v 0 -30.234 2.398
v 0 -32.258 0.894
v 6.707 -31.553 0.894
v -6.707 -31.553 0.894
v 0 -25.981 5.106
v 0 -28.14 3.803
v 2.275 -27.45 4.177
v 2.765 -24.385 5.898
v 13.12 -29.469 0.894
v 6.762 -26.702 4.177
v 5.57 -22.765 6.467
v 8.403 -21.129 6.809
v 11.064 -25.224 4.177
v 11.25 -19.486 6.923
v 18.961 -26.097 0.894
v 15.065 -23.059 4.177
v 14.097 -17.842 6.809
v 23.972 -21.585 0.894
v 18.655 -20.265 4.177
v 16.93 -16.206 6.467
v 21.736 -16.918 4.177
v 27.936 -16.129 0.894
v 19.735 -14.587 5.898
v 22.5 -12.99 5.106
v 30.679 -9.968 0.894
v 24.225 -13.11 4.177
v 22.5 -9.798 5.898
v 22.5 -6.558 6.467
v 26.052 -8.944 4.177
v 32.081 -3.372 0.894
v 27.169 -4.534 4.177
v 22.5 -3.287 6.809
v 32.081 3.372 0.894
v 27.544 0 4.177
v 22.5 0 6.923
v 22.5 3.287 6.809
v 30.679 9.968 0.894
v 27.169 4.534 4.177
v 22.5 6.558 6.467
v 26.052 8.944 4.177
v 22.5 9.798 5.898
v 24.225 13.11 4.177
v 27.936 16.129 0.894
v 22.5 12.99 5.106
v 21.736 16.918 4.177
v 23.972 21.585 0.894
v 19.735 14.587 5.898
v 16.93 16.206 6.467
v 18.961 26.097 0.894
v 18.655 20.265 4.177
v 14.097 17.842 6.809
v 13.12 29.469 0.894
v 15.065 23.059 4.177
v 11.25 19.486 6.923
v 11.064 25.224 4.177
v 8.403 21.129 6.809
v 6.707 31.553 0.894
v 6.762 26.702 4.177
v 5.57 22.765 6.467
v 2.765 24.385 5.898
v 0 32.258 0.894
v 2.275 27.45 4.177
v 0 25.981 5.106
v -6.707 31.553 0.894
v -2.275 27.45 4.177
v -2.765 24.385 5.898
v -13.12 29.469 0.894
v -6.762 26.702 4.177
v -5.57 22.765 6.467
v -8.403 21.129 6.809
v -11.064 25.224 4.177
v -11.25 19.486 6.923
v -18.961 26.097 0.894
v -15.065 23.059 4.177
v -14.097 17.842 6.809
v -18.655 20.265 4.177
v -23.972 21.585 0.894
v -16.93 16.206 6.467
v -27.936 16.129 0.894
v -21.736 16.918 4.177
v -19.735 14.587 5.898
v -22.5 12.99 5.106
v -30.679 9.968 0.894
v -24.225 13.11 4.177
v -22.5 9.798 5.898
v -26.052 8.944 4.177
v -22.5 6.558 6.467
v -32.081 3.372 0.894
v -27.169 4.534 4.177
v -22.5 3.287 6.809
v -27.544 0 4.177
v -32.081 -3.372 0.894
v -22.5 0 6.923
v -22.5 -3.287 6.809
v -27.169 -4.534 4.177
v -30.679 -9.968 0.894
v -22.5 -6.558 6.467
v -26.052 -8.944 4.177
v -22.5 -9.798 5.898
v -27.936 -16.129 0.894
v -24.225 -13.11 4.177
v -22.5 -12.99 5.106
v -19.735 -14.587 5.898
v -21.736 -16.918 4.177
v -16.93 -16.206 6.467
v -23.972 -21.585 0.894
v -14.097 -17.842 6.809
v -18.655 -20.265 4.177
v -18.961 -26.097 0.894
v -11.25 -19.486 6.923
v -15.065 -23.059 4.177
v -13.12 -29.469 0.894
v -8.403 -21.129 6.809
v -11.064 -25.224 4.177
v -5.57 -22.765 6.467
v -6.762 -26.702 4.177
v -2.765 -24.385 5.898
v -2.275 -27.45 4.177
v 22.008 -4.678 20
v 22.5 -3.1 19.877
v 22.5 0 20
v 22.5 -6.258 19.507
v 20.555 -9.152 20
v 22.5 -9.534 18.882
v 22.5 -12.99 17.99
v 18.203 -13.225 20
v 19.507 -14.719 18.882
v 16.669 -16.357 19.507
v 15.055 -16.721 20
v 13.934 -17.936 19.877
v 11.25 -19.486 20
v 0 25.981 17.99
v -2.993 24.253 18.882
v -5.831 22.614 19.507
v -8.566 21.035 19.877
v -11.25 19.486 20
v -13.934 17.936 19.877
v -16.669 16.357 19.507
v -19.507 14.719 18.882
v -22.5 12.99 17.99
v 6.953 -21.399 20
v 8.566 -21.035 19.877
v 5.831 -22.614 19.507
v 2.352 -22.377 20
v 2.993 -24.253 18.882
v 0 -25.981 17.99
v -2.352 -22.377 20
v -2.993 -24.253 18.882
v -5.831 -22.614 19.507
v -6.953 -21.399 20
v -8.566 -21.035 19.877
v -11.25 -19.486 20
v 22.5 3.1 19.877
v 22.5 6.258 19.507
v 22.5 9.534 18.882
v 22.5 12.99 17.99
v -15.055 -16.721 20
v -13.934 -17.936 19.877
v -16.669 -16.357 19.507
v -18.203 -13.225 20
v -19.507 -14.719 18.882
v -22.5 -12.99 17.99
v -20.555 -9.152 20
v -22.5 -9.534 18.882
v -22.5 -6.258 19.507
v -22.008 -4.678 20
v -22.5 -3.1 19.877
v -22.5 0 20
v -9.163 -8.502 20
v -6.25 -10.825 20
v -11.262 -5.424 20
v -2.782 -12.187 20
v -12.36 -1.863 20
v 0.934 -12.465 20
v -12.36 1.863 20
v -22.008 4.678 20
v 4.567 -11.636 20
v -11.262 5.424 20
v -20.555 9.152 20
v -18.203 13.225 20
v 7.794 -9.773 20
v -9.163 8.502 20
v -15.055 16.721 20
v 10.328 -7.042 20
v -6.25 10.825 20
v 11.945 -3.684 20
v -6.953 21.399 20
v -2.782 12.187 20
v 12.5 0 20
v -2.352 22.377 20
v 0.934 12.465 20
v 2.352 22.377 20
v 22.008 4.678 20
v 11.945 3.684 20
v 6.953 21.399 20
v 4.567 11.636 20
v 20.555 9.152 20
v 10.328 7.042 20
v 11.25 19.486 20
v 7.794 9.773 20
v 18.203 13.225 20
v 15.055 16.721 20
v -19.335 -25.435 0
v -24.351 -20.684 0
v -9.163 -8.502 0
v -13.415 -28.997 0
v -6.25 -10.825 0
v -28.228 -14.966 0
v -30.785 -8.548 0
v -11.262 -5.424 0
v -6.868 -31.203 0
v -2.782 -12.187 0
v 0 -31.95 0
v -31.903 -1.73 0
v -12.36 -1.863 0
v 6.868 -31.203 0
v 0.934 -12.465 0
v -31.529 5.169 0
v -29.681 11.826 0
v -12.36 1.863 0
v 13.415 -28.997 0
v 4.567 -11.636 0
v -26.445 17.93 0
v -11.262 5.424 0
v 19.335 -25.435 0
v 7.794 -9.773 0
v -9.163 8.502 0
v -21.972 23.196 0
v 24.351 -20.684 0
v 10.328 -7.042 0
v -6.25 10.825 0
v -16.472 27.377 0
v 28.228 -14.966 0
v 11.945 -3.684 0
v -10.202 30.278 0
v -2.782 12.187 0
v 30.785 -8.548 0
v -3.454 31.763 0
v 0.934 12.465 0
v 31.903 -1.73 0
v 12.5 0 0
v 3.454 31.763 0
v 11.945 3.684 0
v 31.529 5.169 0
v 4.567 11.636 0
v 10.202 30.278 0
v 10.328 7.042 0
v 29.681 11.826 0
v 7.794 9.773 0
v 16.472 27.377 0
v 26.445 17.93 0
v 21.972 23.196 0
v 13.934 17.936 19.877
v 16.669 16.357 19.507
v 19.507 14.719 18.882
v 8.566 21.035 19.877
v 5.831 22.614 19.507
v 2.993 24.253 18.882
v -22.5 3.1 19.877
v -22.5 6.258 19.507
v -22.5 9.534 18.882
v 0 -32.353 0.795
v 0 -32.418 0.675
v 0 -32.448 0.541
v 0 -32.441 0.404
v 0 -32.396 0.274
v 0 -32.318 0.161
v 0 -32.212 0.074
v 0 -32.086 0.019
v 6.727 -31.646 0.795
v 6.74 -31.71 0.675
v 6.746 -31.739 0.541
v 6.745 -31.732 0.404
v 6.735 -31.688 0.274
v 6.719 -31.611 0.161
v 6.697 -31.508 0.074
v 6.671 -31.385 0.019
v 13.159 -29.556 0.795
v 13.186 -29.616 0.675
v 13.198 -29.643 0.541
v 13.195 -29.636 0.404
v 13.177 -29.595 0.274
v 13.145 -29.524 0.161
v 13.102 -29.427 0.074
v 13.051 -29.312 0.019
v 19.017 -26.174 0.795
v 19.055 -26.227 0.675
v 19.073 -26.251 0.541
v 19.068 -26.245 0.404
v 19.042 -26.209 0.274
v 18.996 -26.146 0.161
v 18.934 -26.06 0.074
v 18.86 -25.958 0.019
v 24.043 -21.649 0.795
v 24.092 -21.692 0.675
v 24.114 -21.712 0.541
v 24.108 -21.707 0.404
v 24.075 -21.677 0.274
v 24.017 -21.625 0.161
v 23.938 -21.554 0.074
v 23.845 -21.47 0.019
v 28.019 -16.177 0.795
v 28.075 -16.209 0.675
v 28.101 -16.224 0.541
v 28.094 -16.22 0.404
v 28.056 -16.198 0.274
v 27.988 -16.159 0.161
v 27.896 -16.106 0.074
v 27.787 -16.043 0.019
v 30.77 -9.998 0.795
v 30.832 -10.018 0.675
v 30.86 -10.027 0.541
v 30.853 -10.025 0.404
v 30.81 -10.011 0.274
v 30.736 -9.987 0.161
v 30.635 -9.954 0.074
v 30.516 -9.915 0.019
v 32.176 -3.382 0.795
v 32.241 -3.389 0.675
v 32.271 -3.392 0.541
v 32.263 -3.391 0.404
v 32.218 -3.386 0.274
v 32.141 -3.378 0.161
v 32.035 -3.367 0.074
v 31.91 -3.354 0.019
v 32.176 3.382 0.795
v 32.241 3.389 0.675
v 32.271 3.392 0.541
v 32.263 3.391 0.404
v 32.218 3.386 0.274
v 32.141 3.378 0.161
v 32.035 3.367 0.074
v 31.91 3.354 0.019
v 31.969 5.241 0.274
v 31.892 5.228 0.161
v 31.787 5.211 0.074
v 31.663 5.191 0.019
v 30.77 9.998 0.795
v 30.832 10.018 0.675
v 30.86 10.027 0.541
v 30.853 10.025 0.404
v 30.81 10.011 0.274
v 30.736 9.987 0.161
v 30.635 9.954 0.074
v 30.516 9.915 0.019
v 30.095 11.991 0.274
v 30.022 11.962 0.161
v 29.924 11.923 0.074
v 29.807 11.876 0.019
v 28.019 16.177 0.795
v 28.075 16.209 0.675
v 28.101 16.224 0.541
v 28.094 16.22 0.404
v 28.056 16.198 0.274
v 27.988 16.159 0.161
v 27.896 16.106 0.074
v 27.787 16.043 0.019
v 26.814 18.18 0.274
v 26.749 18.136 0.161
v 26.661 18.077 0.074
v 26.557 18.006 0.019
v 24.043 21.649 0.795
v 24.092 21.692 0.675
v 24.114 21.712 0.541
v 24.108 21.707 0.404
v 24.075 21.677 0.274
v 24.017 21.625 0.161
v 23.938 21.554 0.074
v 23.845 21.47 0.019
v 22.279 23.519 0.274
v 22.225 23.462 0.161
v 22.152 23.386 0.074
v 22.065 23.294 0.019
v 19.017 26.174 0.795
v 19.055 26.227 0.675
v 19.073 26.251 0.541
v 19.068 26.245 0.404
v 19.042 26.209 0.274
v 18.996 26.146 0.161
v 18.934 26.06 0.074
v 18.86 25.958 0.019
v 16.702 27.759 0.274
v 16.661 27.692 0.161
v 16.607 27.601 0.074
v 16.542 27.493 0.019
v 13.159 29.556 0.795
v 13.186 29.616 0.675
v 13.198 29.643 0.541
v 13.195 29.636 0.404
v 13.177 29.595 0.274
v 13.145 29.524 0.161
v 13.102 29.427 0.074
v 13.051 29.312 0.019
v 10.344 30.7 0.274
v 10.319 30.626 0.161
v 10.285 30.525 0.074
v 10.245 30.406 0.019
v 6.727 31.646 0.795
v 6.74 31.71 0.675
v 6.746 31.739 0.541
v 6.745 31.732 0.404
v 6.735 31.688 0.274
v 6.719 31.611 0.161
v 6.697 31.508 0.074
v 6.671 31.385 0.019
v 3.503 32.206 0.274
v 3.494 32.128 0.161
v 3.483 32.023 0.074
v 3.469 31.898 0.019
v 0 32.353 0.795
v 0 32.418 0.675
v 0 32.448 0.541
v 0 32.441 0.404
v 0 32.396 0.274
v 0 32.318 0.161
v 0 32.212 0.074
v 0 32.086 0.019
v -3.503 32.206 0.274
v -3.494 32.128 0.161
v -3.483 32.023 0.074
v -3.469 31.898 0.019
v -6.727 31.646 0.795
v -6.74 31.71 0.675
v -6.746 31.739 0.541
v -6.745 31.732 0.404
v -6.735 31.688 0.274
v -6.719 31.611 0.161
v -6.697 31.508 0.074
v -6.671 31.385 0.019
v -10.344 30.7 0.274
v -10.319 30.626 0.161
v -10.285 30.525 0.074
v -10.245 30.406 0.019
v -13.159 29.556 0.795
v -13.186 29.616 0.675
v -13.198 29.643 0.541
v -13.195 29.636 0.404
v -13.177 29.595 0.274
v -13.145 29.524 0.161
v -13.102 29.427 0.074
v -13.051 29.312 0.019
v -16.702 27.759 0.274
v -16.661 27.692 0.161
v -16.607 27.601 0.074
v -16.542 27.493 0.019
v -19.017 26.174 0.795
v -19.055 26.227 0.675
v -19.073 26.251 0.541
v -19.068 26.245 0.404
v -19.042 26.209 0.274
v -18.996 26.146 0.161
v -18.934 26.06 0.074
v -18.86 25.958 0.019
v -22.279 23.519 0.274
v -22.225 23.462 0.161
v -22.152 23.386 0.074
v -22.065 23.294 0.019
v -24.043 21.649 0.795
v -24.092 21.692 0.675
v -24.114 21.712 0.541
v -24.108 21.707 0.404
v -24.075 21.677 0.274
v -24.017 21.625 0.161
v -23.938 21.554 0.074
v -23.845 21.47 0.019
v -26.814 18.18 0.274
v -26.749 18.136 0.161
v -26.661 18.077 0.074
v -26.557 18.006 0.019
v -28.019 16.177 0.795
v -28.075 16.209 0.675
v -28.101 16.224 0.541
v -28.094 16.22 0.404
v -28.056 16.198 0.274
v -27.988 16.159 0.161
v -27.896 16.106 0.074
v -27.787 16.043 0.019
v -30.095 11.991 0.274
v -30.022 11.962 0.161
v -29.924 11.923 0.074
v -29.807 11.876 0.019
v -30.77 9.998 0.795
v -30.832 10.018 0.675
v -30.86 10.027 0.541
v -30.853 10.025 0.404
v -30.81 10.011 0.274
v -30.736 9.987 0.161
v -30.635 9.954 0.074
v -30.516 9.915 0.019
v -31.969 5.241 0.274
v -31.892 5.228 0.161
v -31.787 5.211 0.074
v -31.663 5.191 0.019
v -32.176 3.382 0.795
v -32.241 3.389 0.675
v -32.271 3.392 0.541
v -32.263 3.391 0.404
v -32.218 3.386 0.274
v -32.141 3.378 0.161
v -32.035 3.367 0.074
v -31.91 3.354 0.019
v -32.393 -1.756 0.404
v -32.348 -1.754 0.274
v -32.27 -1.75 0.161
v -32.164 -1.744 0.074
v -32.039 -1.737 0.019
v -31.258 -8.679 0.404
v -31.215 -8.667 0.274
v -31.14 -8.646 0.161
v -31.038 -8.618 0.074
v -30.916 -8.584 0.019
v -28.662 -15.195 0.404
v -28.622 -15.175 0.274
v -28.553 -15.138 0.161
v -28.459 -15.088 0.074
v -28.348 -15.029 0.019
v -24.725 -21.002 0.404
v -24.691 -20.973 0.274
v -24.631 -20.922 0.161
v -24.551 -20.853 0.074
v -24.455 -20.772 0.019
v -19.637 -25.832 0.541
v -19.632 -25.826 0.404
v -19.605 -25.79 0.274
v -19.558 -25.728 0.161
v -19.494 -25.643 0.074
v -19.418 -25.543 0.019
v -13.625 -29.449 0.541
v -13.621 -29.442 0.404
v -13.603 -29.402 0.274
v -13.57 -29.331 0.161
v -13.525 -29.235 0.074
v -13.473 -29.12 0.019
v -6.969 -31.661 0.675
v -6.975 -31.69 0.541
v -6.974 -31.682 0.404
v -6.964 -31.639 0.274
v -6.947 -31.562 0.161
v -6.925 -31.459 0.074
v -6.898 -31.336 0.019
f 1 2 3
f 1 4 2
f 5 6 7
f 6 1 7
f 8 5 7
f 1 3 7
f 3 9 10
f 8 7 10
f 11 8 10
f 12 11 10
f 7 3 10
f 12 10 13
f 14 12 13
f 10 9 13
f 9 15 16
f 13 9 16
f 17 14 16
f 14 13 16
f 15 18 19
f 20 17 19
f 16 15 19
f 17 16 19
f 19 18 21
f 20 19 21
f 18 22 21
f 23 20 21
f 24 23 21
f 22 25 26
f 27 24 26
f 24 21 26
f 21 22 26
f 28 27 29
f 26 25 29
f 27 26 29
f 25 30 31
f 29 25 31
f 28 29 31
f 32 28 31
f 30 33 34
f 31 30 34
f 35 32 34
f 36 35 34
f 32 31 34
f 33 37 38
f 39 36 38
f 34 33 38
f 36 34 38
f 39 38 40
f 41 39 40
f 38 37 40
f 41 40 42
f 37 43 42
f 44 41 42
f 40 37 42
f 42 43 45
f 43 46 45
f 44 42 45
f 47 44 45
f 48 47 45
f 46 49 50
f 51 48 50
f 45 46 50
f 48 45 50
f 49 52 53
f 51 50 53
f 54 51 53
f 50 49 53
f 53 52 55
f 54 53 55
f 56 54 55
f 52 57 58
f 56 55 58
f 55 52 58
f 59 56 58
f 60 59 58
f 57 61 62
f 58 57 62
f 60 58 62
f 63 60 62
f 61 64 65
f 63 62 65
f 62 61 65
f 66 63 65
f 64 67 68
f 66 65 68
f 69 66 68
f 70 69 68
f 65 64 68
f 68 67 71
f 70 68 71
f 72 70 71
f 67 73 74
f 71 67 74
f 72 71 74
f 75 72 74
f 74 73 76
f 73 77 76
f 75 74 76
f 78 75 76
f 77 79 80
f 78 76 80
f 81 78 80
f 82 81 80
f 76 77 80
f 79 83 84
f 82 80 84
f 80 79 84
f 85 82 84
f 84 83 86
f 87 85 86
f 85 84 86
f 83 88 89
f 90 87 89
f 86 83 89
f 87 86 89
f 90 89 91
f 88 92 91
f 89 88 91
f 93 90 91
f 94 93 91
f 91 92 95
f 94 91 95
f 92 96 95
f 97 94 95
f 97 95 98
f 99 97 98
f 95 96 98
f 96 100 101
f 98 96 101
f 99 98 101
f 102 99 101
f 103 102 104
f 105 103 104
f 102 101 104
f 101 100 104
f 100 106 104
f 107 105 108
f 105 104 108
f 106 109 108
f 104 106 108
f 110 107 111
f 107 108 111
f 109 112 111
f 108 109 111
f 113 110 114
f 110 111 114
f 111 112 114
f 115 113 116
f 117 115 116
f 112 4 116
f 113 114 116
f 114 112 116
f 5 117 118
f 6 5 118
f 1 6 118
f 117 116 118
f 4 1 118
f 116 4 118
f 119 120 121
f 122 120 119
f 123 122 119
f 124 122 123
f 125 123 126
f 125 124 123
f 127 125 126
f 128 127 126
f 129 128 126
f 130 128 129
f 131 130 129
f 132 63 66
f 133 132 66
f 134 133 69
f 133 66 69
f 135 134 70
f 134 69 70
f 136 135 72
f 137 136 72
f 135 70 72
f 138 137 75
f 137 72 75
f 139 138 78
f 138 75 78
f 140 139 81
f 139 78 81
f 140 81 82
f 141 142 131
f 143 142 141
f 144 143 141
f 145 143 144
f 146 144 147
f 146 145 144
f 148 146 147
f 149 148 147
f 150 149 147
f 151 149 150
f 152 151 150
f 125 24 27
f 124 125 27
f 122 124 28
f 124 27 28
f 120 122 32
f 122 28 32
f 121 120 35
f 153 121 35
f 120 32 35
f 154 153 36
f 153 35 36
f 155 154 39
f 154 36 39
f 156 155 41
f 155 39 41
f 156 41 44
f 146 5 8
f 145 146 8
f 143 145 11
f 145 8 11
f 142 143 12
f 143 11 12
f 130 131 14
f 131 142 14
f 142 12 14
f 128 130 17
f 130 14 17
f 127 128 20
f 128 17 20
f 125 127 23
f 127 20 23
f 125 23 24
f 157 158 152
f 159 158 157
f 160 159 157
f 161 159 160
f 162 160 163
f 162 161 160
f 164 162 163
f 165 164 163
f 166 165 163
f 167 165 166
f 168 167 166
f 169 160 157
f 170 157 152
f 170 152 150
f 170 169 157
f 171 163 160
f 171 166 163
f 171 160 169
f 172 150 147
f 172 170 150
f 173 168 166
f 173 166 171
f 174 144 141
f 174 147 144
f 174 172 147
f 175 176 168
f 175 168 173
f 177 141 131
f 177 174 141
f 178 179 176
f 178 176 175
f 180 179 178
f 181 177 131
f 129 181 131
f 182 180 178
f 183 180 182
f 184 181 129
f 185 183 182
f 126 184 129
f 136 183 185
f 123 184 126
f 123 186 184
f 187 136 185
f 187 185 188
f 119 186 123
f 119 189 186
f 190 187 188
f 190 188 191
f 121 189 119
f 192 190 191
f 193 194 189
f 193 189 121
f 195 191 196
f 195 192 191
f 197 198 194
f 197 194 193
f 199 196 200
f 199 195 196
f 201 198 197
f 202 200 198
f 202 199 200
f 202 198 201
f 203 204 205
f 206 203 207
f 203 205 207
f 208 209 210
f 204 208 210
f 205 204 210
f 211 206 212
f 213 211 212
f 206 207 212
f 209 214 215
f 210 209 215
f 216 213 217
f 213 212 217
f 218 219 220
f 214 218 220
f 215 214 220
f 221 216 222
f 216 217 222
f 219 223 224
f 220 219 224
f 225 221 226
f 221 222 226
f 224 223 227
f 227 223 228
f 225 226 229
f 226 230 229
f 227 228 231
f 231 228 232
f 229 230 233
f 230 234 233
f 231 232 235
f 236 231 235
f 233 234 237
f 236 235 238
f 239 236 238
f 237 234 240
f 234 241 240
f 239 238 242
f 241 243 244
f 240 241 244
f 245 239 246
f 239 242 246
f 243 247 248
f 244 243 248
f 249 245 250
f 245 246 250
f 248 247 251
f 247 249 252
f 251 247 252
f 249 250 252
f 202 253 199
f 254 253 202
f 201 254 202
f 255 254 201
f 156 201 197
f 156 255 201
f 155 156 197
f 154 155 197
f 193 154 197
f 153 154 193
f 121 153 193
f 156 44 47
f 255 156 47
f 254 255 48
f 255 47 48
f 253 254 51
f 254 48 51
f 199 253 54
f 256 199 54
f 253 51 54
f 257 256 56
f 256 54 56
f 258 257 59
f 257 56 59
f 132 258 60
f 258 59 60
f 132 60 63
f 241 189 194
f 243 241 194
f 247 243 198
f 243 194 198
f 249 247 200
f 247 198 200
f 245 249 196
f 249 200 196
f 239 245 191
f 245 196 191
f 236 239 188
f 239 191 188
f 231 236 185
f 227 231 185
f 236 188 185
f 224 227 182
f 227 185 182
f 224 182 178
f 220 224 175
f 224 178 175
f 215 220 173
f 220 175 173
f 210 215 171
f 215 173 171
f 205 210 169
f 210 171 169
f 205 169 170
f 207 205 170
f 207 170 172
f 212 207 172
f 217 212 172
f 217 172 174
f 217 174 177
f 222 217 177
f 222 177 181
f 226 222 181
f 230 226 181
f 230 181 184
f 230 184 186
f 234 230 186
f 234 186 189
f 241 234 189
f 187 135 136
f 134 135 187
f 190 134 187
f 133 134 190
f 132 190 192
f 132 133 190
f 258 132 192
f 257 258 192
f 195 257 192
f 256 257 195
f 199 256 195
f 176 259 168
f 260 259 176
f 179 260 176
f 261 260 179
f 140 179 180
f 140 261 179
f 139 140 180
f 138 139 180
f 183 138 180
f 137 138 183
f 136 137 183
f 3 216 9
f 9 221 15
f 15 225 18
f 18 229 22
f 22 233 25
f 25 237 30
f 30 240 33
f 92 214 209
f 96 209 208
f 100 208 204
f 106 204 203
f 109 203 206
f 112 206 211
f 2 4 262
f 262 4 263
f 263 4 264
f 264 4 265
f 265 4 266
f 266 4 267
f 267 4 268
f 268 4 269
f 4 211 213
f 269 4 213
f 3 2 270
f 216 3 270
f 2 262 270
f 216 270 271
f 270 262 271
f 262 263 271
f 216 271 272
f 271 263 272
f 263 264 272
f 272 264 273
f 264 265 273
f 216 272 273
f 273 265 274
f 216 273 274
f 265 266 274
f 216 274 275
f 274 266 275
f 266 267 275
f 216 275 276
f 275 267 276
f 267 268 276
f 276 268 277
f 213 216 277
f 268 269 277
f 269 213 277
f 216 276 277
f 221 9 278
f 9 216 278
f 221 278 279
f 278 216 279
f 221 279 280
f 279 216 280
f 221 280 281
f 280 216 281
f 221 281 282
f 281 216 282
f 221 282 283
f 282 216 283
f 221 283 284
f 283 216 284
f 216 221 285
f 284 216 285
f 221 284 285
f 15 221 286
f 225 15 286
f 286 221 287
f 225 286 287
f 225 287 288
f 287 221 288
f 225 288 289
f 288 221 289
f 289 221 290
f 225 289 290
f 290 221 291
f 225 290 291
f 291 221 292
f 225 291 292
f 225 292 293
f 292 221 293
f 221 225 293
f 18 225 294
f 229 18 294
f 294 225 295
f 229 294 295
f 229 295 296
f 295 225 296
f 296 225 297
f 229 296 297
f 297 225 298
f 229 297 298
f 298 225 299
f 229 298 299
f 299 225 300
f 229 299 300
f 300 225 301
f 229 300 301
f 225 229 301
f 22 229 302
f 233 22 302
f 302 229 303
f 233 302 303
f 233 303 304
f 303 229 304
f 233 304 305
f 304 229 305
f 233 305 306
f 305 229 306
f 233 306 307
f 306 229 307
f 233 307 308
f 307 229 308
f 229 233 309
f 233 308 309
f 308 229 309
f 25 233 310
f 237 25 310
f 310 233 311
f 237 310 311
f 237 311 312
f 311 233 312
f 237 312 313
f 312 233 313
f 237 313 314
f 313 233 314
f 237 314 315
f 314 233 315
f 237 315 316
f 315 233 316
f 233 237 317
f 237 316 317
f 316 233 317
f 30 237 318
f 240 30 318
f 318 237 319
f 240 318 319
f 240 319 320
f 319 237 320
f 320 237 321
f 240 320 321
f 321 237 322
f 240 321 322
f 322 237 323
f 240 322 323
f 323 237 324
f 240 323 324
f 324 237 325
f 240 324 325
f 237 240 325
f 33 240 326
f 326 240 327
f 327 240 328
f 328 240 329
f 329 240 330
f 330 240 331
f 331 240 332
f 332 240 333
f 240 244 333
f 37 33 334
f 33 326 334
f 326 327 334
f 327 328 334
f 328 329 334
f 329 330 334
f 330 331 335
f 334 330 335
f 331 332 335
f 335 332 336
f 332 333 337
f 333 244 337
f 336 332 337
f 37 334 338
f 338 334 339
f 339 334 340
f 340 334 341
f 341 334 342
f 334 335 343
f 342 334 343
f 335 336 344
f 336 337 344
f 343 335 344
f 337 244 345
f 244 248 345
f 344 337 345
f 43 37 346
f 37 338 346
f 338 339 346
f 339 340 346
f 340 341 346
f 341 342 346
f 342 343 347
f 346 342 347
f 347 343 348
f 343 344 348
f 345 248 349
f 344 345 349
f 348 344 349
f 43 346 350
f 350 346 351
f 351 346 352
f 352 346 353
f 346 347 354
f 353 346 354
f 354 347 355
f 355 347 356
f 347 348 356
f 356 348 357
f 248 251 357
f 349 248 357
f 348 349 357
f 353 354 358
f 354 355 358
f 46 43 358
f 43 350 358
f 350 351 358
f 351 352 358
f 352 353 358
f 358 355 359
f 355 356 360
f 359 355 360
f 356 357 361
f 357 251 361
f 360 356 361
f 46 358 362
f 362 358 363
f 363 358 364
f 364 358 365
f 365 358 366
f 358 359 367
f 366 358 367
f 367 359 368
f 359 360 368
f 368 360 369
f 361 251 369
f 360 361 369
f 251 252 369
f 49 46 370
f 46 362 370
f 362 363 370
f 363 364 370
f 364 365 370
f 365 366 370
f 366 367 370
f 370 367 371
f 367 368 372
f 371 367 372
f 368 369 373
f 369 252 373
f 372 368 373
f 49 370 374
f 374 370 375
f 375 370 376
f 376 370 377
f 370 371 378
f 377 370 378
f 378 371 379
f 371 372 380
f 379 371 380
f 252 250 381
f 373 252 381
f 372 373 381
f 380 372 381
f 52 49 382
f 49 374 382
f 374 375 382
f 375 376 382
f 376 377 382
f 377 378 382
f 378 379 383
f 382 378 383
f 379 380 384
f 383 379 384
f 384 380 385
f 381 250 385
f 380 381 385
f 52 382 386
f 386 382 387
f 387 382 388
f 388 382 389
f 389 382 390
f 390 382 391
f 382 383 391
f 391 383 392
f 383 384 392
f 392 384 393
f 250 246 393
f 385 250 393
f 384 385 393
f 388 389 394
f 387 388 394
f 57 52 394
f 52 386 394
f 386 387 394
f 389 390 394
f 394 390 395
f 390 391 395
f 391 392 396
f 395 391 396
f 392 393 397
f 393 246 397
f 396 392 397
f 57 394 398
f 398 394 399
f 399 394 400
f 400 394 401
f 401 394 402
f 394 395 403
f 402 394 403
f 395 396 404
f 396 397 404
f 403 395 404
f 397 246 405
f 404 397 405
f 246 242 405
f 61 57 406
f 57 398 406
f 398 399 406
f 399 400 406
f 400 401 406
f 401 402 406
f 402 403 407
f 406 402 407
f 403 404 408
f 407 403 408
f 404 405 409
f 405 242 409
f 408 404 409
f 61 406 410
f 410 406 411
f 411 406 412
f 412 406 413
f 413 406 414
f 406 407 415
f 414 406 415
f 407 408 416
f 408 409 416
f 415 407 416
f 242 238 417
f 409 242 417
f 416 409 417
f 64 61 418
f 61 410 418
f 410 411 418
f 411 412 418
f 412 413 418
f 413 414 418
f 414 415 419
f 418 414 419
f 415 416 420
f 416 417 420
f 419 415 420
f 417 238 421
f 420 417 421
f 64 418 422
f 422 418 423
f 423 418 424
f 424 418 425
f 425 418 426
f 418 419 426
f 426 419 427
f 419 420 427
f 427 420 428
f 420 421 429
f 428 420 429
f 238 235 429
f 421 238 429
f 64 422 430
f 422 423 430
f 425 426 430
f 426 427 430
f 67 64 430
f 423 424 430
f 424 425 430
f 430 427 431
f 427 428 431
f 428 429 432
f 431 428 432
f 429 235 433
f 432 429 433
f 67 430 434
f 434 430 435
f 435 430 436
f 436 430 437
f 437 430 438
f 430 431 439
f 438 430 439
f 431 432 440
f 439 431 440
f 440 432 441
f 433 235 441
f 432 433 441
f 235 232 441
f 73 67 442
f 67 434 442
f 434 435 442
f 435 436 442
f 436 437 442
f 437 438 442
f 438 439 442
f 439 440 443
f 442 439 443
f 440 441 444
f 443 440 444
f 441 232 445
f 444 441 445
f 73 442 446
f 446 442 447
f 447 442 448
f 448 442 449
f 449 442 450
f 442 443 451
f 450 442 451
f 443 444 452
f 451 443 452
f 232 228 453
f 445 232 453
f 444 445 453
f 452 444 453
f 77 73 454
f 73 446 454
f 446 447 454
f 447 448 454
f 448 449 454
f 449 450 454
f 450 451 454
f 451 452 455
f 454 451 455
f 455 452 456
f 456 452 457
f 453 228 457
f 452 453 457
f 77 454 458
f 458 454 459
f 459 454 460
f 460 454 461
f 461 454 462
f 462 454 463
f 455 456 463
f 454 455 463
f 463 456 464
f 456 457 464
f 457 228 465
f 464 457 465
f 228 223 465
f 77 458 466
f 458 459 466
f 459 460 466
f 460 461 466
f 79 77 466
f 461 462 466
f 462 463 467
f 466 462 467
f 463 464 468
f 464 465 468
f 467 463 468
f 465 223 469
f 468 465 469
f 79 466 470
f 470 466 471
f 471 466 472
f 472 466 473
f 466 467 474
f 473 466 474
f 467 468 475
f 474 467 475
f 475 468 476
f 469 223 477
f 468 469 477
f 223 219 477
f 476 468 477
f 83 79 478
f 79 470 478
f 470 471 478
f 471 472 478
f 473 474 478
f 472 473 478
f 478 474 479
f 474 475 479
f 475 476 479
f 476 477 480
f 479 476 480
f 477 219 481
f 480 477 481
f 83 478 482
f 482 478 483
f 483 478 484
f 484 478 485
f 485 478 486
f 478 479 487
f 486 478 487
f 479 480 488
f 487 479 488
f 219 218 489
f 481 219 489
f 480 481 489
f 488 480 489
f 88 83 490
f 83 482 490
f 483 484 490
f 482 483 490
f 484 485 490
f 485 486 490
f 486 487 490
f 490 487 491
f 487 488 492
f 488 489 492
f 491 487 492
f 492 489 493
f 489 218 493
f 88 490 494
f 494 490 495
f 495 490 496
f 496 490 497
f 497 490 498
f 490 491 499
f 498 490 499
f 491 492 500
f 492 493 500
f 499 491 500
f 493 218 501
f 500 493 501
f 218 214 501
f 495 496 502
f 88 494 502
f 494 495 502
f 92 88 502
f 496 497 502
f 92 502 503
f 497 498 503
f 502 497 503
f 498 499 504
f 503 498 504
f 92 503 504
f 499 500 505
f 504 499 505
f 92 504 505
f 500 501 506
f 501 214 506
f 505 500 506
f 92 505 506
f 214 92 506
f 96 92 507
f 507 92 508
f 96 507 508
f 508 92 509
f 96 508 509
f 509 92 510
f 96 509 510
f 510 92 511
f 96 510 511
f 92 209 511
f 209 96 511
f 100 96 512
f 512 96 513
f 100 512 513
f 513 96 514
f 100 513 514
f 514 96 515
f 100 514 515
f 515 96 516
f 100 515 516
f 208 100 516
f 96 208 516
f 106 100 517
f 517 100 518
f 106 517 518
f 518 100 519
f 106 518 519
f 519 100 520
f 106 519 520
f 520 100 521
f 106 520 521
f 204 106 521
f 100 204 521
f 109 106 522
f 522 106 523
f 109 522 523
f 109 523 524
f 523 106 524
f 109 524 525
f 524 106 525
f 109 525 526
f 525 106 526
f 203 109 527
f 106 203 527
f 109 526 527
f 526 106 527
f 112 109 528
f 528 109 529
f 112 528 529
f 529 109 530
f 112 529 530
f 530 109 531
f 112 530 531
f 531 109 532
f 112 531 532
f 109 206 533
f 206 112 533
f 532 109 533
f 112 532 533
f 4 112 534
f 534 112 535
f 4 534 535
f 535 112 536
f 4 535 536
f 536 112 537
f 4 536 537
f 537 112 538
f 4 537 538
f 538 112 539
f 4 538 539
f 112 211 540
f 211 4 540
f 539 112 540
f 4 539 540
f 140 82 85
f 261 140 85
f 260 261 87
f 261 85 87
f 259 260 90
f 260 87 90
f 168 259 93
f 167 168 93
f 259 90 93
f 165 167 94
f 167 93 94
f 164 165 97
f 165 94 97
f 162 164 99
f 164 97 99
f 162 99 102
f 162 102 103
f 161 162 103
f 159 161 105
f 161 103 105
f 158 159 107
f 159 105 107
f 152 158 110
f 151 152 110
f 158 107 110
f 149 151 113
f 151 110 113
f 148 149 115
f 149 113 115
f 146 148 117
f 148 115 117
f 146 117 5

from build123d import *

# Parameters (mm, degrees)
EXTRUDE_1_DEPTH     = 20
SKETCH_3_OUTSIDE_W  = 154.97
SKETCH_3_OUTSIDE_H  = 154.97
SKETCH_3_OUTSIDE_R  = 22.5
CUT_EXTRUDE_2_DEPTH = 20
CUT_EXTRUDE_2_TAPER = 60
SKETCH_4_R          = 12.5
CUT_EXTRUDE_3_DEPTH = 21


with BuildPart() as part:
    # 草图1 → 凸台-拉伸1 (new body)
    with BuildSketch(Plane.XY):
        Polygon((22.5, -12.990381057), (22.5, 12.990381057), (0, 25.980762114), (-22.5, 12.990381057), (-22.5, -12.990381057), (0, -25.980762114), align=None)
    extrude(amount=EXTRUDE_1_DEPTH)

    # 草图2 → 旋转1 (revolve)
    with BuildSketch(Plane(origin=(0, 0, 0), x_dir=(0, 0, -1), z_dir=(1, 0, 0))):
        with BuildLine():
            Line((0, 0), (-12, 0))
            ThreePointArc((-12, 0), (-9.145772075, -17.058051419), (-0.894027207, -32.257802794))
            ThreePointArc((-0.894027207, -32.257802794), (-0.337232687, -32.42276506), (0, -31.95))
            Line((0, -31.95), (0, 0))
        make_face()
    revolve(axis=Axis((0, 0, 0), (0, 0, 1)))

    # 草图3 outside → 切除-拉伸2 (cut)
    with BuildSketch(Plane.XY.offset(20)):
        Rectangle(SKETCH_3_OUTSIDE_W, SKETCH_3_OUTSIDE_H)
        Circle(SKETCH_3_OUTSIDE_R, mode=Mode.SUBTRACT)
    extrude(amount=-CUT_EXTRUDE_2_DEPTH, taper=CUT_EXTRUDE_2_TAPER, mode=Mode.SUBTRACT)

    # 草图4 → 切除-拉伸3 (cut, through all)
    with BuildSketch(Plane.XY.offset(20)):
        Circle(SKETCH_4_R)
    extrude(amount=-CUT_EXTRUDE_3_DEPTH, mode=Mode.SUBTRACT)


solid = part.part
